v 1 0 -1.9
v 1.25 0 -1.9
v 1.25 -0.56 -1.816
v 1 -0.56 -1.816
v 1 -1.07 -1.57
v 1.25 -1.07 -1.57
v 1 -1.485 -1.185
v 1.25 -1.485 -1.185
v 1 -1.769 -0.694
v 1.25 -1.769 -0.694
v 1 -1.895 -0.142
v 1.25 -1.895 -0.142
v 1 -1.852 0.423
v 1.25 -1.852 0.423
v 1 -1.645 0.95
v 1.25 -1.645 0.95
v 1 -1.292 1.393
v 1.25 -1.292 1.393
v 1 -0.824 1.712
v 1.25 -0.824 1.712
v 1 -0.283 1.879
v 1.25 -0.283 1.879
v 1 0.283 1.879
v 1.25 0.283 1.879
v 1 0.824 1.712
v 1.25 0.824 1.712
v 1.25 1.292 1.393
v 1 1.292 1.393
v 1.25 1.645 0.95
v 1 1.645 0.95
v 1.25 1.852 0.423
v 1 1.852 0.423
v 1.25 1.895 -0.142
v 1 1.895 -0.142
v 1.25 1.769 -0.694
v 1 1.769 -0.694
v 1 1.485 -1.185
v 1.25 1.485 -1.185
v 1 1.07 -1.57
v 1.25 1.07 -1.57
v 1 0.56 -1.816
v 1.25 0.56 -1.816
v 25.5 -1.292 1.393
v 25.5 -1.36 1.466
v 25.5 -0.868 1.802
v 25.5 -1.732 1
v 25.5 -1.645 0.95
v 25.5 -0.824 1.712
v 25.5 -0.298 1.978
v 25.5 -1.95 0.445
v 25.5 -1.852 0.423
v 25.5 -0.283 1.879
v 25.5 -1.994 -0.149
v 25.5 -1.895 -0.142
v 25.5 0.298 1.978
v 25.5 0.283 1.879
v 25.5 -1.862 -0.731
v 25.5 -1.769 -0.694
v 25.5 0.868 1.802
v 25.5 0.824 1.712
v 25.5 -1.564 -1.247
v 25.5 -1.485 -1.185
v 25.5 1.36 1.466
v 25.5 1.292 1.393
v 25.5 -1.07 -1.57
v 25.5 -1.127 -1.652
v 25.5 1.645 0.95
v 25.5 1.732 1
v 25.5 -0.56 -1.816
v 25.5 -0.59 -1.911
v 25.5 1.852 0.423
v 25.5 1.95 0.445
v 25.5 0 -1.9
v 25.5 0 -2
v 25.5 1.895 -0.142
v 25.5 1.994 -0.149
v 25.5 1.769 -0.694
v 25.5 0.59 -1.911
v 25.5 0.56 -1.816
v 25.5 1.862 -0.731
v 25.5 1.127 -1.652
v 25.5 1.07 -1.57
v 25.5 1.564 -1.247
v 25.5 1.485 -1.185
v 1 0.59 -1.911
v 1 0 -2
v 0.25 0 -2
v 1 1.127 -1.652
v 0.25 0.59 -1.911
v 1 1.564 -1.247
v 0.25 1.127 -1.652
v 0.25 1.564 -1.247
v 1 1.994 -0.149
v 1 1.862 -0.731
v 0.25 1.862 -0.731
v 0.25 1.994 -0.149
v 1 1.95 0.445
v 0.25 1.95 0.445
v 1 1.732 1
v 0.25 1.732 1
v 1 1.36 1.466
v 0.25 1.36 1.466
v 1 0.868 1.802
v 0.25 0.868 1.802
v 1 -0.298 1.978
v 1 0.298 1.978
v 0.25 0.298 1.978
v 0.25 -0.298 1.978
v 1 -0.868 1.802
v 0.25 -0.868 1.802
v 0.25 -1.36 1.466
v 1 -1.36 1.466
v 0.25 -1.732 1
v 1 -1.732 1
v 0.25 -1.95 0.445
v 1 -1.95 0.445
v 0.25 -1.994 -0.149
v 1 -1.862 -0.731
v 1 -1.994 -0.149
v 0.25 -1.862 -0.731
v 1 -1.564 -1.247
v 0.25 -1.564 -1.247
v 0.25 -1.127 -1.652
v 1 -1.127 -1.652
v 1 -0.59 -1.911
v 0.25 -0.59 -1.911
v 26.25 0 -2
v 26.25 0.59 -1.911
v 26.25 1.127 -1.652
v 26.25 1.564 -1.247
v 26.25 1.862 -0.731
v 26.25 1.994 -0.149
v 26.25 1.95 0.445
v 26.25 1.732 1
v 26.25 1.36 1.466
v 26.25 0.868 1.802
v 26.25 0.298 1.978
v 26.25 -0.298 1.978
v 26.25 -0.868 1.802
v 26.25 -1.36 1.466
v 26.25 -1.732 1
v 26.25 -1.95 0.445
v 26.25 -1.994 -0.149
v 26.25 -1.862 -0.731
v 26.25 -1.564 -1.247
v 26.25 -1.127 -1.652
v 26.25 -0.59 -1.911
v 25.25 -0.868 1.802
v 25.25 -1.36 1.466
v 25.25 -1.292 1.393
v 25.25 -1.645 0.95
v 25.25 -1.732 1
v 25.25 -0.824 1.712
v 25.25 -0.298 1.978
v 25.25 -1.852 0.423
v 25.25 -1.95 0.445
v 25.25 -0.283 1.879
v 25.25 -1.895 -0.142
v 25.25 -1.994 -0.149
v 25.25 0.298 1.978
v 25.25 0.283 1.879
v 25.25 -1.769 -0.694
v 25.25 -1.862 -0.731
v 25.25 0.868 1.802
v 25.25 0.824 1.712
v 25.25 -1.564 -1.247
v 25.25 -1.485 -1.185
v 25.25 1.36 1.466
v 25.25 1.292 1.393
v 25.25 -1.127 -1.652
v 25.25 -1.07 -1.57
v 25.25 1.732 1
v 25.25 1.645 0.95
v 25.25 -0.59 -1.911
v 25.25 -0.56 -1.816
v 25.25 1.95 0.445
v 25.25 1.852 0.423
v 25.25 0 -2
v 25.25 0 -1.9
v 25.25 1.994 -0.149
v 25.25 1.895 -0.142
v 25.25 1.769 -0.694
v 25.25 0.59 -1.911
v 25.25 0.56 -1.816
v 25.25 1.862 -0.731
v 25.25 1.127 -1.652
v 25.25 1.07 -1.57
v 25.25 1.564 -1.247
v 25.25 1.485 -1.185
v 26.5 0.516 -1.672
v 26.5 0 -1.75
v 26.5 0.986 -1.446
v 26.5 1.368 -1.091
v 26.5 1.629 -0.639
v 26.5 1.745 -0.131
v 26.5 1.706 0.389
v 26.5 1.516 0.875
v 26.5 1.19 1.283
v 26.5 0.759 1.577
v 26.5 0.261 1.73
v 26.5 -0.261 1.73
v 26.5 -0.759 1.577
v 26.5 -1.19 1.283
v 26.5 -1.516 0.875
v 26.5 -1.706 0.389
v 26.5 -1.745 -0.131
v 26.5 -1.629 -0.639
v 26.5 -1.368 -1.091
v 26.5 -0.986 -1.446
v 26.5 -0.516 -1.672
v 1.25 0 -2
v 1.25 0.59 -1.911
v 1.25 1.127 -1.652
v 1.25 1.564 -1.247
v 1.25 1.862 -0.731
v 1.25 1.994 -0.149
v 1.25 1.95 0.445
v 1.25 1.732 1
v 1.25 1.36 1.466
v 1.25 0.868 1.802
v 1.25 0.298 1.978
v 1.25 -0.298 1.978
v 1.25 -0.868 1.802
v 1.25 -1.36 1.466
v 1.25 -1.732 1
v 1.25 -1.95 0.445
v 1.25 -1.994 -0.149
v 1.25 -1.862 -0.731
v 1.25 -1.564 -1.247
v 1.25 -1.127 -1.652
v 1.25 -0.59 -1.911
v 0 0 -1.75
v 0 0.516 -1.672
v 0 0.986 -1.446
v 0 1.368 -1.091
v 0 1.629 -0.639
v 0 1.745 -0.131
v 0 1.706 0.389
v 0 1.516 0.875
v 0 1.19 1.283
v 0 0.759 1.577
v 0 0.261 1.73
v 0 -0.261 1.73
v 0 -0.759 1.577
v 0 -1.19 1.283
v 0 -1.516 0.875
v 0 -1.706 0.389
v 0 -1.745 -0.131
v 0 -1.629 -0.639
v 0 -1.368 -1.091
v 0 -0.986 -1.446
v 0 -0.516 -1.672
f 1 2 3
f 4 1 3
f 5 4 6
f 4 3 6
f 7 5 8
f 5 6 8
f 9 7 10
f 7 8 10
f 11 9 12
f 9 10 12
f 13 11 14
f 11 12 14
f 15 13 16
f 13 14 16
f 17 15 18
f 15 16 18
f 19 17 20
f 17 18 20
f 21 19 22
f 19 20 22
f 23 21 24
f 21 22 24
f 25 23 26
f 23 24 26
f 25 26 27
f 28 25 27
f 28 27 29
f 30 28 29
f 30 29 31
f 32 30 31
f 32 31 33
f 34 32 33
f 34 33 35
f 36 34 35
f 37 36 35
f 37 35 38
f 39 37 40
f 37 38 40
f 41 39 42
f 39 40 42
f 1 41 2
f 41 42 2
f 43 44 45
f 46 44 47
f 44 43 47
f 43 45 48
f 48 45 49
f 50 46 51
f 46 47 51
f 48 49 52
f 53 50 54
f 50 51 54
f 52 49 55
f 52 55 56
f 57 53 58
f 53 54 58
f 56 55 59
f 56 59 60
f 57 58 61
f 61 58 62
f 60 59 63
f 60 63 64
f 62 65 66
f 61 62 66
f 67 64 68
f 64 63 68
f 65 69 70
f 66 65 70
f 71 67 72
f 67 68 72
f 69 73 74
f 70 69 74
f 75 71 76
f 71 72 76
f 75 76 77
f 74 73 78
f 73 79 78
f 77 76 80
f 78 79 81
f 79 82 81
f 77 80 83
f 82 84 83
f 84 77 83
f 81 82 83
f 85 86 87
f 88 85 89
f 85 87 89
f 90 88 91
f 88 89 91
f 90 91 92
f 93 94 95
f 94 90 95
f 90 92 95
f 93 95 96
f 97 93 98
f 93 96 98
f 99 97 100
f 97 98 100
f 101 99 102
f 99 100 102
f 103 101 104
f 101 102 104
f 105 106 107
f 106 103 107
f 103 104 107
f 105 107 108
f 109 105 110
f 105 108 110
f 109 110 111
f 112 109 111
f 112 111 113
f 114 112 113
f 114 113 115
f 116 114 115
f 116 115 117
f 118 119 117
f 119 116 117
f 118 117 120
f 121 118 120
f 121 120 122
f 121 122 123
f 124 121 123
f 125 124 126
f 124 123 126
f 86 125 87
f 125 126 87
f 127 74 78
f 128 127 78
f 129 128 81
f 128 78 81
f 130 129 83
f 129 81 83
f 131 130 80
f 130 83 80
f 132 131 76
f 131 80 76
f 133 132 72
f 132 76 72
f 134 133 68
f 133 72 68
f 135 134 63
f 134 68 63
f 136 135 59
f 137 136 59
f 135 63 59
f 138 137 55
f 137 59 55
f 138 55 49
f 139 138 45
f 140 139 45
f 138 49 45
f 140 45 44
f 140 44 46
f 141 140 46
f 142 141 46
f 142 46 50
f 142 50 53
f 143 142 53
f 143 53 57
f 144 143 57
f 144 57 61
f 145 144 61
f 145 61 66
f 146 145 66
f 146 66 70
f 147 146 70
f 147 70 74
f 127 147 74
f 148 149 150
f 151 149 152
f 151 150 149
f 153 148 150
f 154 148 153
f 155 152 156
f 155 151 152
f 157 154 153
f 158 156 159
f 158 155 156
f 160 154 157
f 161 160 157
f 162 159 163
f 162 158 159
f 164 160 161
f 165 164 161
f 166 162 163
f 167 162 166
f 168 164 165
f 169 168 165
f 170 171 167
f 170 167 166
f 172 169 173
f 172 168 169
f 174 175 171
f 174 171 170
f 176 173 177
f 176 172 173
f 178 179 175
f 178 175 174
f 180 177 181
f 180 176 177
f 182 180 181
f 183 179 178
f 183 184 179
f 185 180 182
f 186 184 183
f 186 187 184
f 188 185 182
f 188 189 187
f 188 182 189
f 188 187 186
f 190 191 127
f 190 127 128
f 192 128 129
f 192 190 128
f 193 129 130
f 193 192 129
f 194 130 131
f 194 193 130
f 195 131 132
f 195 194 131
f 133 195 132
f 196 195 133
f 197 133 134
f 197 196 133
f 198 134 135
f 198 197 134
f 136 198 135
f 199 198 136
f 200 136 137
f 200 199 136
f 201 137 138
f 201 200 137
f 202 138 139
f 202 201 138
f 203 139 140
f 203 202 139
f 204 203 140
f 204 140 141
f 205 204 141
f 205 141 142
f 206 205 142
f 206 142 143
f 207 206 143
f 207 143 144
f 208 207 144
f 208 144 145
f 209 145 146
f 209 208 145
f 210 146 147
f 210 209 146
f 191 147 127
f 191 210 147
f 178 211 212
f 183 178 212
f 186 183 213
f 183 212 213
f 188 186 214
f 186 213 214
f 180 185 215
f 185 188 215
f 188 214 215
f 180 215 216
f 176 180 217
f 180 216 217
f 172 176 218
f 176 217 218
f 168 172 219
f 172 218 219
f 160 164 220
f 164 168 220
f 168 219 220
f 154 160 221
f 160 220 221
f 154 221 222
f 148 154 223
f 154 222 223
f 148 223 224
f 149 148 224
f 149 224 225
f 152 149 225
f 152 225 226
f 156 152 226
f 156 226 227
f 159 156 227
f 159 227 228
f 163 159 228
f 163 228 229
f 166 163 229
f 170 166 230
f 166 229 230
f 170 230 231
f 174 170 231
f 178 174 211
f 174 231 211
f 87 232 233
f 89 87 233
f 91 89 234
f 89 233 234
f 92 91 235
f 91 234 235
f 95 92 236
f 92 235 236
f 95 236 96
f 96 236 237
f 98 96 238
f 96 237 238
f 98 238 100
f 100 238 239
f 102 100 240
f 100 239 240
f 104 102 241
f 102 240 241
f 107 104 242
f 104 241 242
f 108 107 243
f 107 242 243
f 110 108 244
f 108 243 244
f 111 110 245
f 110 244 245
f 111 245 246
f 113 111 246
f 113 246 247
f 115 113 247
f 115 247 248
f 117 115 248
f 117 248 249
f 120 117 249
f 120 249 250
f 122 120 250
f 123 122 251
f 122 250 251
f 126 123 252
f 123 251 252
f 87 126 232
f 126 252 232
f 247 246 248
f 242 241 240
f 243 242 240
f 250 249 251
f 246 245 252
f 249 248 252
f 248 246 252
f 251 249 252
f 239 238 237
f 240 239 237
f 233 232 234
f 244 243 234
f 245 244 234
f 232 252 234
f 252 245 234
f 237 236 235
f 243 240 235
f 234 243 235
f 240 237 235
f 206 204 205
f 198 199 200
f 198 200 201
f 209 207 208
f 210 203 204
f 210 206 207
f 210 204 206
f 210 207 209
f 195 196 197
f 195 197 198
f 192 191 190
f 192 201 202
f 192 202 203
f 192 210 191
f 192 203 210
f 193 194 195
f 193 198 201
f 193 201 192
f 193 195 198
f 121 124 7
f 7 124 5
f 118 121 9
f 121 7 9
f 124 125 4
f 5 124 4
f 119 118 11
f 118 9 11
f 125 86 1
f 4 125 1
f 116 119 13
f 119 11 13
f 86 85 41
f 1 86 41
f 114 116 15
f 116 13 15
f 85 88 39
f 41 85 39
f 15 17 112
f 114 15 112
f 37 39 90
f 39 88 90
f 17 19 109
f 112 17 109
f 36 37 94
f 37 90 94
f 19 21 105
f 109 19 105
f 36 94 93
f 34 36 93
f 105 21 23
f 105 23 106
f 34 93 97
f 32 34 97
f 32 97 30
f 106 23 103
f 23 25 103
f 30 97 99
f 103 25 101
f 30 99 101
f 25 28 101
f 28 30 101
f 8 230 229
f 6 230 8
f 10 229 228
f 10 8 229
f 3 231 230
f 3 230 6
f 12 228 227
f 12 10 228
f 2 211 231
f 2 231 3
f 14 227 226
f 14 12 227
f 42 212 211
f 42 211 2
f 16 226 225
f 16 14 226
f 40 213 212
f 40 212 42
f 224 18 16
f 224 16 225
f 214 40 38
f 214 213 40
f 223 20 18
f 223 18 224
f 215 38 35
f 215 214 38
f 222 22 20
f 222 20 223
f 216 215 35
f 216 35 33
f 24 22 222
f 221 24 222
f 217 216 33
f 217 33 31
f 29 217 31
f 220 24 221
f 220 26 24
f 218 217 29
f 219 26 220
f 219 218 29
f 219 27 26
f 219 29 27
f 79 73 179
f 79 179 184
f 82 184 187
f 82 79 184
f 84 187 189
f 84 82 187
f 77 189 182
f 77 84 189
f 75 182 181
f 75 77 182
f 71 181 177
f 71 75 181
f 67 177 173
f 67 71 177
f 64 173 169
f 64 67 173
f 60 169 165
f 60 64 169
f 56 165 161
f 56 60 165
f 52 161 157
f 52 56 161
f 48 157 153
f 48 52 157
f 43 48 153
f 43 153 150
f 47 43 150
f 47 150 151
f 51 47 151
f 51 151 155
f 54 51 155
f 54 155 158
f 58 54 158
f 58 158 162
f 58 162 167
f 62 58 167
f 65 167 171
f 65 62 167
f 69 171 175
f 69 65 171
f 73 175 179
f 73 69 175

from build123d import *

# Parameters (mm, degrees)
SKETCH1_R           = 2
BOSS_EXTRUDE1_DEPTH = 26.5
CUT_EXTRUDE2_START  = -1
SKETCH2_R           = 2.498108329
SKETCH2_R_2         = 1.9
CUT_EXTRUDE2_DEPTH  = 0.25
CUT_EXTRUDE3_START  = -1.25
SKETCH3_R           = 2.5
SKETCH3_R_2         = 1.9
CUT_EXTRUDE3_DEPTH  = 0.25
CHAMFER1_SIZE       = 0.25


with BuildPart() as part:
    # Sketch1 → Boss-Extrude1 (new body)
    with BuildSketch(Plane(origin=(0, 0, 0), x_dir=(0, 0, -1), z_dir=(1, 0, 0))):
        Circle(SKETCH1_R)
    extrude(amount=BOSS_EXTRUDE1_DEPTH)

    # Sketch2 → Cut-Extrude2 (cut)
    with BuildSketch(Plane(origin=(26.5, 0, 0), x_dir=(0, 0, -1), z_dir=(1, 0, 0)).offset(CUT_EXTRUDE2_START)):
        Circle(SKETCH2_R)
        Circle(SKETCH2_R_2, mode=Mode.SUBTRACT)
    extrude(amount=-CUT_EXTRUDE2_DEPTH, mode=Mode.SUBTRACT)

    # Sketch3 → Cut-Extrude3 (cut)
    with BuildSketch(Plane.ZY.offset(CUT_EXTRUDE3_START)):
        Circle(SKETCH3_R)
        with Locations(Location((0, 0, 0), (0, 0, 180))):
            Circle(SKETCH3_R_2, mode=Mode.SUBTRACT)
    extrude(amount=CUT_EXTRUDE3_DEPTH, mode=Mode.SUBTRACT)

    # Chamfer1
    chamfer1_edges = [part.edges().sort_by_distance(p)[0] for p in [
        (0, 0, 2),
        (26.5, 0, 2),
    ]]
    chamfer(chamfer1_edges, length=CHAMFER1_SIZE)


solid = part.part
